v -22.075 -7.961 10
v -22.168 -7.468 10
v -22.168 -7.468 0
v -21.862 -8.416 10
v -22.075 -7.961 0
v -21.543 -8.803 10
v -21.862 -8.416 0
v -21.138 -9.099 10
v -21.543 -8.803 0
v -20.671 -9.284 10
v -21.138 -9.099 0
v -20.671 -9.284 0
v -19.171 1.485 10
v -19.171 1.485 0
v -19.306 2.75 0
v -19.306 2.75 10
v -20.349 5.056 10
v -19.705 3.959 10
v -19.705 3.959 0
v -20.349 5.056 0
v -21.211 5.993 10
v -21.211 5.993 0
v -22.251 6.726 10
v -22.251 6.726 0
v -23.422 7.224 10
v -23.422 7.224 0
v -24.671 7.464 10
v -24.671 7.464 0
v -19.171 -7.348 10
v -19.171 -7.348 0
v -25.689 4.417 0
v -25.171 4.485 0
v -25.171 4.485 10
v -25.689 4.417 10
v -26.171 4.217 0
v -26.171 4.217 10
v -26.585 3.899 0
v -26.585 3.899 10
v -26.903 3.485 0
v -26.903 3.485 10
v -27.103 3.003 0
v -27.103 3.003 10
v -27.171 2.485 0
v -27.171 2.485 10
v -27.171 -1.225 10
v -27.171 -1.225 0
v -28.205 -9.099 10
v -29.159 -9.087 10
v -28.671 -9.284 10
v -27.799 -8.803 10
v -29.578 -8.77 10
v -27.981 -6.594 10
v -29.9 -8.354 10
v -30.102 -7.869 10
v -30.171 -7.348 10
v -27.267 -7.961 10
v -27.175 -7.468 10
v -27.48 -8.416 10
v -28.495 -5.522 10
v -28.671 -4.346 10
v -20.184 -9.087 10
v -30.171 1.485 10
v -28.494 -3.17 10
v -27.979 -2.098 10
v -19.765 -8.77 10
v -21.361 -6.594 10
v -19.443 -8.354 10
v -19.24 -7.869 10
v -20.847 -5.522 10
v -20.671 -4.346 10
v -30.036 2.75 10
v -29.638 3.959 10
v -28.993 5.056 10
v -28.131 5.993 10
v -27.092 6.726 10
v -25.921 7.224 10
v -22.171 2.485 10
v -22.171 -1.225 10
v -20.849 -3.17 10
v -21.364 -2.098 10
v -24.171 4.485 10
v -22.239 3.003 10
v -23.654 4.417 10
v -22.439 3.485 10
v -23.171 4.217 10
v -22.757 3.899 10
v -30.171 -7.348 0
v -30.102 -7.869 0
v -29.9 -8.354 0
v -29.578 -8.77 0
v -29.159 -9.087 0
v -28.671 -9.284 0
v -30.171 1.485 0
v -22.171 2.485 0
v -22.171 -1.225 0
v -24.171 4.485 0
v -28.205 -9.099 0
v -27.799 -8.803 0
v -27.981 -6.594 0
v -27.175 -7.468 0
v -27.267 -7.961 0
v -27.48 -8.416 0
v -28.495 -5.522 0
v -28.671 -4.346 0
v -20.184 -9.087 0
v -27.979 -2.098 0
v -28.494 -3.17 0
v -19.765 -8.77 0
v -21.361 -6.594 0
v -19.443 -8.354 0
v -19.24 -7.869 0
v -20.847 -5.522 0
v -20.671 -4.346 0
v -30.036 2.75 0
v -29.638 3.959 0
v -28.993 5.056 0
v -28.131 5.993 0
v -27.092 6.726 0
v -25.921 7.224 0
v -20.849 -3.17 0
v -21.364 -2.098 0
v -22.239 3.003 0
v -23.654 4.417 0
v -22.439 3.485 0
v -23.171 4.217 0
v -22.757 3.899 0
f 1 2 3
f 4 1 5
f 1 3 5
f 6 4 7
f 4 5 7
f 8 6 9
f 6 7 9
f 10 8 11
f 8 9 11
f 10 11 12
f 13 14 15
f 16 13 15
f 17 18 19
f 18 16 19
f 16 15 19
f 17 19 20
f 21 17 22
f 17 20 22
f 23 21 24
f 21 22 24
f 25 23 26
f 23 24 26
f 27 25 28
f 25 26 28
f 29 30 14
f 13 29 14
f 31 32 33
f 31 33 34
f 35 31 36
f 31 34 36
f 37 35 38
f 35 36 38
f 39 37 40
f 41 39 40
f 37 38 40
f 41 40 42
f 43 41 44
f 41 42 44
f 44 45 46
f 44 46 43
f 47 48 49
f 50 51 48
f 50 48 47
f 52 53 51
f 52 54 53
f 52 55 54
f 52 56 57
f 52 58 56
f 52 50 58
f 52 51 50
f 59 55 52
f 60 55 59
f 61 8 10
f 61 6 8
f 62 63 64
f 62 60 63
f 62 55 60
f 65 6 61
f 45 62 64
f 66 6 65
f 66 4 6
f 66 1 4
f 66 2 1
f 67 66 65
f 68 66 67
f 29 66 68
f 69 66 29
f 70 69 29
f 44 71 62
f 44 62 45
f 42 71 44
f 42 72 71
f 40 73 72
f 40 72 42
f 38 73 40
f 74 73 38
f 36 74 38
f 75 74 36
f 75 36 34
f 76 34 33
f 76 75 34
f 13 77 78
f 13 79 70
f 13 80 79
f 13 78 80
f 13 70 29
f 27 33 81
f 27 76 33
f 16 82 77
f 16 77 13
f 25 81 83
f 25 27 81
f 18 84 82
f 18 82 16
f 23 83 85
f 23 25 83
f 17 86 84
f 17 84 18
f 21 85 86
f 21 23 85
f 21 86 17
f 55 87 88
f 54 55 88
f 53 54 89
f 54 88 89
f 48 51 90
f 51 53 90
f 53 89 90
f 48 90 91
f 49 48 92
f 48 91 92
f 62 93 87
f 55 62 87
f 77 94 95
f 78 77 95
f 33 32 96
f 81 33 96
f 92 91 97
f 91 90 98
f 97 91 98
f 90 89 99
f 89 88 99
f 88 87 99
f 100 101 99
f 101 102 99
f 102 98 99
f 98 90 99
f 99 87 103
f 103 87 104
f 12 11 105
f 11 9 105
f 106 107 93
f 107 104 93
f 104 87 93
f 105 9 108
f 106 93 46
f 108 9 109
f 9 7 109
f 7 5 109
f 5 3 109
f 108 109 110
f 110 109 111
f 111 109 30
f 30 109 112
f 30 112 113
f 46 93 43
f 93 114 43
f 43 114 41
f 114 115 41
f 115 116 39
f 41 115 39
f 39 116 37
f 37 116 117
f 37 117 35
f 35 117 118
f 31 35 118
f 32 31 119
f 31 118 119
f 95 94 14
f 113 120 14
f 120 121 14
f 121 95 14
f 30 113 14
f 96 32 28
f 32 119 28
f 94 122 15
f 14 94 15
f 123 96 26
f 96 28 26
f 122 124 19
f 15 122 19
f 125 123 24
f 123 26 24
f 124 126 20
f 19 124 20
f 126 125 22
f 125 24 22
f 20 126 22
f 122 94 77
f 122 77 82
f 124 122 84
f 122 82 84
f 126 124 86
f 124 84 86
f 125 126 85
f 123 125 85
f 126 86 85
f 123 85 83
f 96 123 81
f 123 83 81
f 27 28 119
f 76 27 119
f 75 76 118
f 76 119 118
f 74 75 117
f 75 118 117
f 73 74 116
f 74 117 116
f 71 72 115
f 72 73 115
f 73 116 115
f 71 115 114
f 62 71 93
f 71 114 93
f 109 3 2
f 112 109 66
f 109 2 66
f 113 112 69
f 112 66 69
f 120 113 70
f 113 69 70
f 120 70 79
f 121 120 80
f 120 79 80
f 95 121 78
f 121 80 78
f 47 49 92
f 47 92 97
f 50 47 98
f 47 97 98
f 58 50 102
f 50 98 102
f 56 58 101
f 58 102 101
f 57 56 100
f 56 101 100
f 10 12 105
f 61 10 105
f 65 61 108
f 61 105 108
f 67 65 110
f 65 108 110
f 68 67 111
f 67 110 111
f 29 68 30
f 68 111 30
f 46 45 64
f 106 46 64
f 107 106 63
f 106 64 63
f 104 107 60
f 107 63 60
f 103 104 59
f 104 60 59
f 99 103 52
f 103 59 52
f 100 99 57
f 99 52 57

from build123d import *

# Parameters (mm, degrees)
BOSS_EXTRUDE1_DEPTH = 10
FILLET1_R           = 6
FILLET2_R           = 2
FILLET3_R           = 2
SKETCH2_R           = 4
CUT_EXTRUDE1_DEPTH  = 34.113449774


with BuildPart() as part:
    # Sketch1 → Boss-Extrude1 (new body)
    with BuildSketch(Plane.XY):
        with BuildLine():
            Line((-27.171188048, -9.347902097), (-27.171188048, -6.180932375))
            ThreePointArc((-27.171188048, -6.180932375), (-27.771188048, -4.347902097), (-27.171188048, -2.514871819))
            Line((-27.171188048, -2.514871819), (-27.171188048, 4.485128181))
            Line((-27.171188048, 4.485128181), (-22.171188048, 4.485128181))
            Line((-22.171188048, 4.485128181), (-22.171188048, -2.514871819))
            ThreePointArc((-22.171188048, -2.514871819), (-21.725004076, -3.38353702), (-21.571188048, -4.347902097))
            ThreePointArc((-21.571188048, -4.347902097), (-21.725004076, -5.312267173), (-22.171188048, -6.180932375))
            Line((-22.171188048, -6.180932375), (-22.171188048, -9.347902097))
            Line((-22.171188048, -9.347902097), (-19.171188048, -9.347902097))
            Line((-19.171188048, -9.347902097), (-19.171188048, 7.485128181))
            Line((-19.171188048, 7.485128181), (-30.171188048, 7.485128181))
            Line((-30.171188048, 7.485128181), (-30.171188048, -9.347902097))
            Line((-30.171188048, -9.347902097), (-27.171188048, -9.347902097))
        make_face()
    extrude(amount=BOSS_EXTRUDE1_DEPTH)

    # Fillet1
    # the kernel refuses this fillet: 6 mm, written as the material it takes off along each edge
    with BuildSketch(Plane(origin=(-19.171188048, 7.485128181, -15), x_dir=(-1, 0, 0), z_dir=(0, 0, 1))) as fillet1_piece_1:
        with BuildLine():
            CenterArc((FILLET1_R, FILLET1_R), FILLET1_R, 180, 90)
            Line((0, FILLET1_R), (0, 0))
            Line((0, 0), (FILLET1_R, 0))
        make_face()
    extrude(amount=40, mode=Mode.SUBTRACT)
    with BuildSketch(Plane(origin=(-30.171188048, 7.485128181, -15), x_dir=(1, 0, 0), z_dir=(0, 0, 1))) as fillet1_piece_2:
        with BuildLine():
            CenterArc((FILLET1_R, -FILLET1_R), FILLET1_R, 90, 90)
            Line((0, -FILLET1_R), (0, 0))
            Line((0, 0), (FILLET1_R, 0))
        make_face()
    extrude(amount=40, mode=Mode.SUBTRACT)

    # Fillet2
    # the kernel refuses this fillet: 2 mm, written as the material it takes off along each edge
    with BuildSketch(Plane(origin=(-19.171188048, -9.347902097, -5), x_dir=(0, 1, 0), z_dir=(0, 0, 1)), Plane(origin=(-22.171188048, -9.347902097, -5), x_dir=(1, 0, 0), z_dir=(0, 0, 1)), Plane(origin=(-30.171188048, -9.347902097, -5), x_dir=(1, 0, 0), z_dir=(0, 0, 1))) as fillet2_piece_1:
        with BuildLine():
            CenterArc((FILLET2_R, FILLET2_R), FILLET2_R, 180, 90)
            Line((0, FILLET2_R), (0, 0))
            Line((0, 0), (FILLET2_R, 0))
        make_face()
    extrude(amount=20, mode=Mode.SUBTRACT)
    with BuildSketch(Plane(origin=(-27.171188048, -9.347902097, -5), x_dir=(-1, 0, 0), z_dir=(0, 0, 1))) as fillet2_piece_2:
        with BuildLine():
            CenterArc((FILLET2_R, -FILLET2_R), FILLET2_R, 90, 90)
            Line((0, -FILLET2_R), (0, 0))
            Line((0, 0), (FILLET2_R, 0))
        make_face()
    extrude(amount=20, mode=Mode.SUBTRACT)

    # Fillet3
    fillet3_edges = [part.edges().sort_by_distance(p)[0] for p in [
        (-22.171188048, 4.485128181, 5),
        (-27.171188048, 4.485128181, 5),
    ]]
    fillet(fillet3_edges, radius=FILLET3_R)

    # Sketch2 → Cut-Extrude1 (cut, through all)
    with BuildSketch(Plane.XY.offset(10)):
        with Locations((-24.671188048, -4.347902097)):
            Circle(SKETCH2_R)
    extrude(amount=-CUT_EXTRUDE1_DEPTH, mode=Mode.SUBTRACT)


solid = part.part
